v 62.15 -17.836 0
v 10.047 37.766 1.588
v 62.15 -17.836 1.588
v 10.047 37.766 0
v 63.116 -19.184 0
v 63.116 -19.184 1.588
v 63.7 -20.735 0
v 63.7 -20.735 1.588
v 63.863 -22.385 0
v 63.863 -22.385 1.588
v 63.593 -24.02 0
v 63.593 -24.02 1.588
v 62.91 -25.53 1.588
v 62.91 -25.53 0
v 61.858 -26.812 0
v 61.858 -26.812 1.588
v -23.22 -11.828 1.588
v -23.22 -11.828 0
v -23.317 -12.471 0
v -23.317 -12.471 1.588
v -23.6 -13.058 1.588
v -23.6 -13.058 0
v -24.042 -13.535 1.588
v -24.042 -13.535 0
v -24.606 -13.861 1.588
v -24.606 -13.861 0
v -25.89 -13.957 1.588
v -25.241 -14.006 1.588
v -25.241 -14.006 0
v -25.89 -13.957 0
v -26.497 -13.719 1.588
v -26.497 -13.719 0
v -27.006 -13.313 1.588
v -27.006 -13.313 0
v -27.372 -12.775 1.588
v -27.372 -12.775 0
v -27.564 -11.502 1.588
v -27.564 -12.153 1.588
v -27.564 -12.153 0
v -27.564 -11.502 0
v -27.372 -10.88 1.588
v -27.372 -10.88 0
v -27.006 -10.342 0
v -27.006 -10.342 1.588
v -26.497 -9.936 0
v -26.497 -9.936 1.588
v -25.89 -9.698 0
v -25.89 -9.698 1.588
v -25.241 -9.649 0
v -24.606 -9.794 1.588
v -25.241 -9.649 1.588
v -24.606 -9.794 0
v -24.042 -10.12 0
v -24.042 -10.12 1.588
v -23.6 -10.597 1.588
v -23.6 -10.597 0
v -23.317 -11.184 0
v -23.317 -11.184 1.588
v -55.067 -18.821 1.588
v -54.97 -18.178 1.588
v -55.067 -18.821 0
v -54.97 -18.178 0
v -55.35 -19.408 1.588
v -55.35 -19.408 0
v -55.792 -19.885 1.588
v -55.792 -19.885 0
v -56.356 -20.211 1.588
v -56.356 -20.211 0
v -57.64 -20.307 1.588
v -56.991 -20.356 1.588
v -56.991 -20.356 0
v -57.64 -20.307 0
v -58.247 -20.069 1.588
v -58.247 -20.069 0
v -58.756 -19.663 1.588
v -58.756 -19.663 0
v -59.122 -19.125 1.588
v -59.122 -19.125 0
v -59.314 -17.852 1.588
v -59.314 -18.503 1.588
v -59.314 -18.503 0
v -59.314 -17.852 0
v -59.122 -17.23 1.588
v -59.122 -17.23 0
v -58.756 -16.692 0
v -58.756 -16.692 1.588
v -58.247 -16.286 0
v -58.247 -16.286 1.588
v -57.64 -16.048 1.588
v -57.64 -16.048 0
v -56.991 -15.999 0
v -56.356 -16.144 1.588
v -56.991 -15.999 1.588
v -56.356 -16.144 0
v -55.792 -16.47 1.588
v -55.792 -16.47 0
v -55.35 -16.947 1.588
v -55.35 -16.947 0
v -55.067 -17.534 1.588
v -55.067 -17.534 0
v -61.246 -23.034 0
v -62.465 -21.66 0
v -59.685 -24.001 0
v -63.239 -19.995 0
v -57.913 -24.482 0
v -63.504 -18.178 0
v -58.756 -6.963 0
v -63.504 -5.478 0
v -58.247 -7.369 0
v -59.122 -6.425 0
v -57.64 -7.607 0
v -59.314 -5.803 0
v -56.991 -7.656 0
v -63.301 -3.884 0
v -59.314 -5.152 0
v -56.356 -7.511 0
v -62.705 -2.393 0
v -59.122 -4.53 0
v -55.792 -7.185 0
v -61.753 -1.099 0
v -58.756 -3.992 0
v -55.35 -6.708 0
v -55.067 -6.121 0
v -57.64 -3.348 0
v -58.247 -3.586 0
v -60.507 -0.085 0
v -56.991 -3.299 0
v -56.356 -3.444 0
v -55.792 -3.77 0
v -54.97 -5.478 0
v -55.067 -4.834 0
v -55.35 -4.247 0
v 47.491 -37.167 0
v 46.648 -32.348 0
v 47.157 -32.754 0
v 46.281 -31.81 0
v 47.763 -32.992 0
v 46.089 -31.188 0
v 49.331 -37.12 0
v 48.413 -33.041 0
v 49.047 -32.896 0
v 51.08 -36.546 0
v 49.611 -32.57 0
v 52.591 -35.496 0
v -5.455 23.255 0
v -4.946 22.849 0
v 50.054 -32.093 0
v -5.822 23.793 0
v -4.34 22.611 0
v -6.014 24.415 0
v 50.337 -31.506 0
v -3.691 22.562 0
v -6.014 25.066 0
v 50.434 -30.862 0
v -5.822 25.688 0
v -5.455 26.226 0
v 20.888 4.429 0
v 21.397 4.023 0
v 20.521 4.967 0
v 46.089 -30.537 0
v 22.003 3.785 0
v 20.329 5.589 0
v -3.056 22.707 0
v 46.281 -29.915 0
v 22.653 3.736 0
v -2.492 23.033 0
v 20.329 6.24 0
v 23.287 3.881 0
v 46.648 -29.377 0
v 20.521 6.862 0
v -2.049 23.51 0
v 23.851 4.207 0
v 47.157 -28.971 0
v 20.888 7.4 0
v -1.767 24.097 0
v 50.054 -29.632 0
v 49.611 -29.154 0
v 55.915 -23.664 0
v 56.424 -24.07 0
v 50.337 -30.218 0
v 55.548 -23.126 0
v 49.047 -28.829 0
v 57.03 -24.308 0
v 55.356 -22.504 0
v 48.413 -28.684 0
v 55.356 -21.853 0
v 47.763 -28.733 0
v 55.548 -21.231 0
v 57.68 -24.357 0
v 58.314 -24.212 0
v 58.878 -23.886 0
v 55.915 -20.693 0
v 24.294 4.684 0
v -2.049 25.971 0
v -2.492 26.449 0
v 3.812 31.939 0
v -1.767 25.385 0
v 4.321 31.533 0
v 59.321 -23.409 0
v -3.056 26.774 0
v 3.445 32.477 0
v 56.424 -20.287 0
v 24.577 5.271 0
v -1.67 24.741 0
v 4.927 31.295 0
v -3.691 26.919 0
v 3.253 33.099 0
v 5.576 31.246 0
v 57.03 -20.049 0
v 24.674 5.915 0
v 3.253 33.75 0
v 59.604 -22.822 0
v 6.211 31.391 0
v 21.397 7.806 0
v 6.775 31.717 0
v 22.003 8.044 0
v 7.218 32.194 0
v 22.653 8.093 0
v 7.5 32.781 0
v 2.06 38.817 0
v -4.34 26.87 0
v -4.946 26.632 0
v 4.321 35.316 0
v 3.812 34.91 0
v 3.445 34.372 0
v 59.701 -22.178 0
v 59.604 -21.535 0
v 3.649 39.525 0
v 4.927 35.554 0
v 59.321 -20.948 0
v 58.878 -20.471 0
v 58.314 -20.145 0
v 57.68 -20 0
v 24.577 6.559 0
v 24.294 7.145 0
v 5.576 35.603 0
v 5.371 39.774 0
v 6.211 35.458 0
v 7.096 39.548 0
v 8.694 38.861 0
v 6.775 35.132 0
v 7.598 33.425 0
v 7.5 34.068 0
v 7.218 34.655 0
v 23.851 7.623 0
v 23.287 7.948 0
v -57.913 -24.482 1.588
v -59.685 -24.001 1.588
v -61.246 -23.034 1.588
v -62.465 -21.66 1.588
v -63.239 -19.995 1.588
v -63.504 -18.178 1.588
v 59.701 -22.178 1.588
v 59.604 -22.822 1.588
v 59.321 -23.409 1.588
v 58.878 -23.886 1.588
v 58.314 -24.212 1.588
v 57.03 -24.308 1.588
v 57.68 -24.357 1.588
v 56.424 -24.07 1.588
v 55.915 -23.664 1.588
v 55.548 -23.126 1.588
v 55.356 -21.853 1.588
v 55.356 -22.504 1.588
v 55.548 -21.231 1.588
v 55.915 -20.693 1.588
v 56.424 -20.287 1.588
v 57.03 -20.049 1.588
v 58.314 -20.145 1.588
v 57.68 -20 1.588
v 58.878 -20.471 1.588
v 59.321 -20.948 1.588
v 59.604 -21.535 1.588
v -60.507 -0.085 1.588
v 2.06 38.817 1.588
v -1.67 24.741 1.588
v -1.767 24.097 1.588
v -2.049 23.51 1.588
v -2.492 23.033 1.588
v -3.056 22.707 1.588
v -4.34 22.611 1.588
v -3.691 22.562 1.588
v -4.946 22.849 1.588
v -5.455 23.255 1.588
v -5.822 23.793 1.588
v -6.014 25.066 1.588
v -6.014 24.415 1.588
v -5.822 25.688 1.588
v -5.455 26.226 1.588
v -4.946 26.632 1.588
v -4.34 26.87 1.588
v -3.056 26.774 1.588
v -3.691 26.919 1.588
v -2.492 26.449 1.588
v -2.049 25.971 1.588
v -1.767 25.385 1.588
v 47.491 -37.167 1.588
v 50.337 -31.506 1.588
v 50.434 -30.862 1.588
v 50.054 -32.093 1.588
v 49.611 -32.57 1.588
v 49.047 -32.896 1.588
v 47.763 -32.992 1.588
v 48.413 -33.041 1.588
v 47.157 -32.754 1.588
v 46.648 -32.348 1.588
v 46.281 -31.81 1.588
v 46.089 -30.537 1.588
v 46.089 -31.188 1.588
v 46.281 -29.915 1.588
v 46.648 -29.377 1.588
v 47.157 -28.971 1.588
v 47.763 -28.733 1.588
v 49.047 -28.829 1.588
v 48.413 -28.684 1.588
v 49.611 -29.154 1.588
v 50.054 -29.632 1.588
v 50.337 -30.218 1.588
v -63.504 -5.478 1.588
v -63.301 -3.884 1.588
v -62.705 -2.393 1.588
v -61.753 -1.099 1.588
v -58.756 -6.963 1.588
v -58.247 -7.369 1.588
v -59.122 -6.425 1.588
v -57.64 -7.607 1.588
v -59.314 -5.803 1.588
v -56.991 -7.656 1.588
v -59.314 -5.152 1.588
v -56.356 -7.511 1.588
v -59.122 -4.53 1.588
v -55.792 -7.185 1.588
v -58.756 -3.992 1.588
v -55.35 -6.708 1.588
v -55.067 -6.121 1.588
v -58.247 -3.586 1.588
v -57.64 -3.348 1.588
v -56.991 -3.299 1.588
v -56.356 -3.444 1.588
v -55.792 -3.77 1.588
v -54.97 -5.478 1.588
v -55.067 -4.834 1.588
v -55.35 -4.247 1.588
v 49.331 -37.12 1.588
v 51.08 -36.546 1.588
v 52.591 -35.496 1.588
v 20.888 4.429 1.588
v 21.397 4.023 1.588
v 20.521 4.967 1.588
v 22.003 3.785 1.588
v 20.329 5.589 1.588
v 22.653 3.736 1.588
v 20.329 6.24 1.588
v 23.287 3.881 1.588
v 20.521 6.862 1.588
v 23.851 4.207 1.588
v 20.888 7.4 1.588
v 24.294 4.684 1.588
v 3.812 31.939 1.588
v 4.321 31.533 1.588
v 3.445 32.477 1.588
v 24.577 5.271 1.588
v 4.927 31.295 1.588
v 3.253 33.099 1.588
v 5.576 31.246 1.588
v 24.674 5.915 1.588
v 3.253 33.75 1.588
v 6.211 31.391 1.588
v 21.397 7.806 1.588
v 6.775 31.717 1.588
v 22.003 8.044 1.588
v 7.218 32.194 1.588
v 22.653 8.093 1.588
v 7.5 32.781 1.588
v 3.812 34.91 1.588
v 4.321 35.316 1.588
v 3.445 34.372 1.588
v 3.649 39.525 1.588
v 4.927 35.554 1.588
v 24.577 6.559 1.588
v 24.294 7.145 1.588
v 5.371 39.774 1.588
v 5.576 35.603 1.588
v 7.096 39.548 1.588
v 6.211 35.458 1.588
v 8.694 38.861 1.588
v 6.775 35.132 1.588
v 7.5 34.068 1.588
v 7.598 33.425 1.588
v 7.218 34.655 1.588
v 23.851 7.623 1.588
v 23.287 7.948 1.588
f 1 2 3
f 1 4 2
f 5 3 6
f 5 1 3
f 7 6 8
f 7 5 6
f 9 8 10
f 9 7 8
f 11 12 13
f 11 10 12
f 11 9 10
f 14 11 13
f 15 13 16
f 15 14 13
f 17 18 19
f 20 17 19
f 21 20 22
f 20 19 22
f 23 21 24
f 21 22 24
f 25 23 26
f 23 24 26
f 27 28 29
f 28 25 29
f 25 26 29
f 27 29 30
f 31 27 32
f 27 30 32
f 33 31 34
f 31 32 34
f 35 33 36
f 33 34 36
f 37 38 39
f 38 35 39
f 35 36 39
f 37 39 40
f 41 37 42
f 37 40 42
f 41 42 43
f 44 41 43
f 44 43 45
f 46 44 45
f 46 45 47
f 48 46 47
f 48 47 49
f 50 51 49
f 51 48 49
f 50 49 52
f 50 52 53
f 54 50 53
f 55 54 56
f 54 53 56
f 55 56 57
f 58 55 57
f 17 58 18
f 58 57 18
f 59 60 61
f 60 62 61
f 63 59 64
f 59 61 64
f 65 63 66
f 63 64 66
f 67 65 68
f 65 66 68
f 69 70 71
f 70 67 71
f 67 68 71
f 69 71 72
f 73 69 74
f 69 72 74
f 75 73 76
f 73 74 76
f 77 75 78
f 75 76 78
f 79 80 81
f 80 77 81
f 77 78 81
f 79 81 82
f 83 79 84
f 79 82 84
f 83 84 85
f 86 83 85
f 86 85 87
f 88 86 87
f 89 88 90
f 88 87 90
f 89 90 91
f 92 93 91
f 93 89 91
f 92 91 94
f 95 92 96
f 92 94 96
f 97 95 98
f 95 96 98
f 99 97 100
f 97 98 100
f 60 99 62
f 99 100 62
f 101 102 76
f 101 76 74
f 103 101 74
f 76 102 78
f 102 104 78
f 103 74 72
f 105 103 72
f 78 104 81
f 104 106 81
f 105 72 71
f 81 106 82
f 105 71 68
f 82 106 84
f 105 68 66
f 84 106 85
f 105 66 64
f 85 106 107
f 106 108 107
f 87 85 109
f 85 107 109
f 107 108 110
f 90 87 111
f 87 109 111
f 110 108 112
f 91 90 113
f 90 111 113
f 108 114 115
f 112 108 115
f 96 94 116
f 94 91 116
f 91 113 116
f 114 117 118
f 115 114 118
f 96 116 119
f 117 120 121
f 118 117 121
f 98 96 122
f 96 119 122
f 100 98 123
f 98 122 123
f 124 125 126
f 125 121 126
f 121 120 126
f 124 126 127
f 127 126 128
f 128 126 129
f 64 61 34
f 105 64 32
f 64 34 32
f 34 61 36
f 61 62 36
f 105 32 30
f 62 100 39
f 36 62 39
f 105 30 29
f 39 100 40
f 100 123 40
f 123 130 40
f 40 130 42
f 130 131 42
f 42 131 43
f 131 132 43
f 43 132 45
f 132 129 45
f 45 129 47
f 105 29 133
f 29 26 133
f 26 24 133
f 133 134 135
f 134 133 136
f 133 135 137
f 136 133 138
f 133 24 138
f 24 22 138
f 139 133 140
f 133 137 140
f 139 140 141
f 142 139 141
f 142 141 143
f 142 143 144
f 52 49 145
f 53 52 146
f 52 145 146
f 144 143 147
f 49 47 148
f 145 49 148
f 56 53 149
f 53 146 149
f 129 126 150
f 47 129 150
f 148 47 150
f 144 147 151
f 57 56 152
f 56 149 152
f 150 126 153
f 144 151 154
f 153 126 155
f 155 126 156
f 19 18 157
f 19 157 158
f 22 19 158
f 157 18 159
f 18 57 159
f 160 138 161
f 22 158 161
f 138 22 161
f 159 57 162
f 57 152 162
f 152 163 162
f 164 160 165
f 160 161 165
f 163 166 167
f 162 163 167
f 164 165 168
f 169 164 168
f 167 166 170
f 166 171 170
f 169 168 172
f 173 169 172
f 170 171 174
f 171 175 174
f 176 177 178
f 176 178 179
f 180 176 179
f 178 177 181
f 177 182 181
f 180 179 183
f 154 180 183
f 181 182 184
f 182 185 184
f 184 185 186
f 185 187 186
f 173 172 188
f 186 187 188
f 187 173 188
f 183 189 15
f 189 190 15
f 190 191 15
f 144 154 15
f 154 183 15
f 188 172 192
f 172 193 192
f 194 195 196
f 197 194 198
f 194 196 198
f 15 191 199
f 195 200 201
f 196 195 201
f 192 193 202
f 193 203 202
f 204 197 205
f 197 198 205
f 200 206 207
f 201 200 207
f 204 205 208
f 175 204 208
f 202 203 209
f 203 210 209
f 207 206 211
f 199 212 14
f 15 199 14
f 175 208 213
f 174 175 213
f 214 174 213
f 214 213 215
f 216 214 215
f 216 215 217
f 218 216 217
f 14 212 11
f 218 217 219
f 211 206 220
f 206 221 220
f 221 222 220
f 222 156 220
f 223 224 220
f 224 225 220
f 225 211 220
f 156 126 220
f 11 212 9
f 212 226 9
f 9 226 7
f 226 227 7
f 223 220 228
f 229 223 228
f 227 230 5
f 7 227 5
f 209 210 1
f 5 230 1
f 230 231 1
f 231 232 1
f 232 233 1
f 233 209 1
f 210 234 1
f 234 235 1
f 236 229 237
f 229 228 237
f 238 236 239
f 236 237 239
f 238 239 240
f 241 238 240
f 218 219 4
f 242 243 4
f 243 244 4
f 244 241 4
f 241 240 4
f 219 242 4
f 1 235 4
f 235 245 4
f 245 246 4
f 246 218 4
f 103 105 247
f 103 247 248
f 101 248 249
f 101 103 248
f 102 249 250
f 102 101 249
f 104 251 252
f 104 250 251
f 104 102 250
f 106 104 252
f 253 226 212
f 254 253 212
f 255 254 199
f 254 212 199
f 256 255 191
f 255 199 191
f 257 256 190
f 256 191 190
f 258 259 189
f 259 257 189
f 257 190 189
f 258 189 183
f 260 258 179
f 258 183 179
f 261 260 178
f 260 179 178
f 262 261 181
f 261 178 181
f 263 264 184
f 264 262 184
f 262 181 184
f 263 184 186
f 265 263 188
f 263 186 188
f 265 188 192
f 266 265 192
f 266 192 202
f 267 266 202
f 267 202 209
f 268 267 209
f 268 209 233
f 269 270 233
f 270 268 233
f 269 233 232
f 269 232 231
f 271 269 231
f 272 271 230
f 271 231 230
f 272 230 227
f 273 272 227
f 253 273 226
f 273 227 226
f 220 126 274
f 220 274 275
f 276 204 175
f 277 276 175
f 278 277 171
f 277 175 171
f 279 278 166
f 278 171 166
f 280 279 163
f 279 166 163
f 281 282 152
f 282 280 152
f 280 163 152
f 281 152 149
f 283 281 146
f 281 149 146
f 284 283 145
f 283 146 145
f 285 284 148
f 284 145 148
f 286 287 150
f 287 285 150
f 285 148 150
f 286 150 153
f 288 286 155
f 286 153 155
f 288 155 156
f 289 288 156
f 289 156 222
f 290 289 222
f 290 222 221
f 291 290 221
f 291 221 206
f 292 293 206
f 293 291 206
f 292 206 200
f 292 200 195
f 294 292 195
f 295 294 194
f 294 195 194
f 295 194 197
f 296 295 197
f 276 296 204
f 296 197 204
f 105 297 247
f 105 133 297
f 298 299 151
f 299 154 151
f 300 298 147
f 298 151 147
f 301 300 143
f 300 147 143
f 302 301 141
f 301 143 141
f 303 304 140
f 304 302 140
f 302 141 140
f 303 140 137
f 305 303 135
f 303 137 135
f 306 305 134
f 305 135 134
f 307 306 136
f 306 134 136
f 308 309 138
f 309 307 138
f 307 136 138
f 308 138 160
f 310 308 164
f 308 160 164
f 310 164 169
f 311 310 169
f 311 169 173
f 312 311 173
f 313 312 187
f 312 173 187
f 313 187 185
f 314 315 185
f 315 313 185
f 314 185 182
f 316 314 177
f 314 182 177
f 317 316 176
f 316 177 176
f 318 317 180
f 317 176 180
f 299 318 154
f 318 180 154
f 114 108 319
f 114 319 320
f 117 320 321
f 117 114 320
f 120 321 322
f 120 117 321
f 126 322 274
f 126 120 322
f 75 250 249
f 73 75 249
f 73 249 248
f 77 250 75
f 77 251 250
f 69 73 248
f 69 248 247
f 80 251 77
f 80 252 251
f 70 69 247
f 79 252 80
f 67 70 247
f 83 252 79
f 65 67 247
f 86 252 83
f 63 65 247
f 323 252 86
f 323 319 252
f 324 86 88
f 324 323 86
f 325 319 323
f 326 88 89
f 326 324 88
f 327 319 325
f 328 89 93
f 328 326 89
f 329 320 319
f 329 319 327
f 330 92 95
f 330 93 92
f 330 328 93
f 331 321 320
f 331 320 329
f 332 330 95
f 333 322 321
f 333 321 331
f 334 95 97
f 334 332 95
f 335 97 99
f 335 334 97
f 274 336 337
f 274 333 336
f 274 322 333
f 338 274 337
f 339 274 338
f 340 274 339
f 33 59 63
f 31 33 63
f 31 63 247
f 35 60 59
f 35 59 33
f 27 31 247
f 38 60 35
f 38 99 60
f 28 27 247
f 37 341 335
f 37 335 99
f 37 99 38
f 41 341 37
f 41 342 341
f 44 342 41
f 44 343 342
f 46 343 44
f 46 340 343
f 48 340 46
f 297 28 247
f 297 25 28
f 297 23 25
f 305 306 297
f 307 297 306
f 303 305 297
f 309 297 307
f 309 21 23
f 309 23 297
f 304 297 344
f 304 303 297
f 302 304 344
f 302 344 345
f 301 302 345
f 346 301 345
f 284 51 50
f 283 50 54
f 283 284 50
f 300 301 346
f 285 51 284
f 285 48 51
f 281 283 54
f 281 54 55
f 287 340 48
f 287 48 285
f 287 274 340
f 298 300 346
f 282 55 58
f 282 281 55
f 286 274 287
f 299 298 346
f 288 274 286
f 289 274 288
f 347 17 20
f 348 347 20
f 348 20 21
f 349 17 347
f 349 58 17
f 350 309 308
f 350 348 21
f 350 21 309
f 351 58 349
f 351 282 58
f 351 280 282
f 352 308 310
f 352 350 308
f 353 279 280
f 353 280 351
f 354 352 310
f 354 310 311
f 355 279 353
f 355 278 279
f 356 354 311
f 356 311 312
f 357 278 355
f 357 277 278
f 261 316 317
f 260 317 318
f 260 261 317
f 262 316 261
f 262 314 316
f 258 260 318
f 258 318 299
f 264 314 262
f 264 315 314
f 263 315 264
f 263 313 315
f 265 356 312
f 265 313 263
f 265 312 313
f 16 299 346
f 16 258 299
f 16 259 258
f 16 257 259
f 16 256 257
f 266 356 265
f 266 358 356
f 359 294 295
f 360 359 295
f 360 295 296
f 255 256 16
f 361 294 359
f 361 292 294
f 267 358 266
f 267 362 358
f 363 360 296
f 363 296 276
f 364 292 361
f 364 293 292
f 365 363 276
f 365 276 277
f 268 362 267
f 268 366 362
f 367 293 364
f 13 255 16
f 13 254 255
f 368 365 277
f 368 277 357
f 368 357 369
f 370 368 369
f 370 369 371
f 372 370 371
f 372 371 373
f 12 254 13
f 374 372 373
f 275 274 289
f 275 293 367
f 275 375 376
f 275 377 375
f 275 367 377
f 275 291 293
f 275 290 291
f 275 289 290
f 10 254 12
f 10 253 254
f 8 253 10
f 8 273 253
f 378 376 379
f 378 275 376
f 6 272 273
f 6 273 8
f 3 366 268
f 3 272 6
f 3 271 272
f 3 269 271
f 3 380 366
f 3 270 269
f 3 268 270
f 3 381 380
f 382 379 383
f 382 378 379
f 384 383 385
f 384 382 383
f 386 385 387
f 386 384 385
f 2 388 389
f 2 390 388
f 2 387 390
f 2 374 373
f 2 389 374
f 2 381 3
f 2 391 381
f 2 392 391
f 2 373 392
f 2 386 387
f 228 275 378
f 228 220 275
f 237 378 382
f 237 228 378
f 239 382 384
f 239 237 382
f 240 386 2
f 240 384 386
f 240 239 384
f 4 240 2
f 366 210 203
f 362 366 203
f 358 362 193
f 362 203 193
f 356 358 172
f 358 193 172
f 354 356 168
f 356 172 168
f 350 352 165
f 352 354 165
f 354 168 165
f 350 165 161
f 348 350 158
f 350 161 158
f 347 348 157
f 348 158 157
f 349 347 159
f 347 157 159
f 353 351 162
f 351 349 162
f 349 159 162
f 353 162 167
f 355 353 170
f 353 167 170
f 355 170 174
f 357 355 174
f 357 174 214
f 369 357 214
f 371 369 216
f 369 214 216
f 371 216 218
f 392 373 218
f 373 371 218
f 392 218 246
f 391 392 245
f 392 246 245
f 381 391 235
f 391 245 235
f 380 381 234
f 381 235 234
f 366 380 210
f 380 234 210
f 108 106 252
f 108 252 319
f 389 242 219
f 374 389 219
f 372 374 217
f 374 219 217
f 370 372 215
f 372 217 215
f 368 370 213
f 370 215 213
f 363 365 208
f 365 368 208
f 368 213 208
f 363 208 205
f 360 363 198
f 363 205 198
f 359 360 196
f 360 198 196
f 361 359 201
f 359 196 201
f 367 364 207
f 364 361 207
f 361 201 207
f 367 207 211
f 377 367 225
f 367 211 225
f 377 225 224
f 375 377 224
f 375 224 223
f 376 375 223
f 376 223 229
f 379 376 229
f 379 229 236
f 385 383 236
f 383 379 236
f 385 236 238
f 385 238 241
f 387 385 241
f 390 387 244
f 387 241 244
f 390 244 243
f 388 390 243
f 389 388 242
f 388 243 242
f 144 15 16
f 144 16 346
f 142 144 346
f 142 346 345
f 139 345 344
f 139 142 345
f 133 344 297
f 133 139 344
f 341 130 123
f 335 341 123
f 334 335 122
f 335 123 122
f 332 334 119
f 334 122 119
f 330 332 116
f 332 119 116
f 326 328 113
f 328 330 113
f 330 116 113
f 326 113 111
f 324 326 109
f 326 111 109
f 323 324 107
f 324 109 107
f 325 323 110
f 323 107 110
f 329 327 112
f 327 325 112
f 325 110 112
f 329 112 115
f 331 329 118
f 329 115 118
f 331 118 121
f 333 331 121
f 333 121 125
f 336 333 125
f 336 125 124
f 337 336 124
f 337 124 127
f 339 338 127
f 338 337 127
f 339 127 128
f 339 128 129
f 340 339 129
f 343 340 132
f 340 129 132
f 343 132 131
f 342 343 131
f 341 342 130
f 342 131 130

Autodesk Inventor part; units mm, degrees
ref_plane "YZ Plane" through (0, 0, 0) normal (1, 0, 0) x (0, 1, 0)
ref_plane "XZ Plane" through (0, 0, 0) normal (0, 1, 0) x (-1, 0, 0)
ref_plane "XY Plane" through (0, 0, 0) normal (0, 0, 1) x (1, 0, 0)
sketch "Sketch1" plane through (0, 0, 0) normal (0, 0, 1) x (1, 0, 0)
  circle A0 centre (48.2493, -30.8623) radius 2.1844
  circle A1 centre (57.5164, -22.1784) radius 2.1844
  circle A2 centre (5.4131, 33.4246) radius 2.1844
  circle A3 centre (-3.854, 24.7407) radius 2.1844
  circle A4 centre (22.4893, 5.9147) radius 2.1844
  circle A5 centre (-57.1544, -5.4775) radius 2.1844 construction
  circle A6 centre (-57.1544, -18.1775) radius 2.1844 construction
  arc A7 (-60.5073, -0.0848) -> (-63.5044, -5.4775) centre (-57.1544, -5.4775) ccw
  arc A8 (-63.5044, -18.1775) -> (-57.9131, -24.482) centre (-57.1544, -18.1775) ccw
  circle A9 centre (-57.1544, -5.4775) radius 2.1844
  circle A10 centre (-57.1544, -18.1775) radius 2.1844
  arc A11 (10.0467, 37.7665) -> (2.0602, 38.8172) centre (5.4131, 33.4246) ccw
  arc A12 (61.8584, -26.812) -> (62.15, -17.8364) centre (57.5164, -22.1784) ccw
  arc A13 (47.4906, -37.1668) -> (52.5912, -35.4958) centre (48.2493, -30.8623) ccw
  line L0 (10.0467, 37.7665) -> (62.15, -17.8364)
  line L1 (61.8584, -26.812) -> (52.5912, -35.4958)
  line L2 (47.4906, -37.1668) -> (-57.9131, -24.482)
  line L3 (-63.5044, -18.1775) -> (-63.5044, -5.4775)
  line L4 (-60.5073, -0.0848) -> (2.0602, 38.8172)
  circle A14 centre (-25.4044, -11.8275) radius 2.1844
  dimension "d0" = 12.7
  dimension "d1" = 12.7
  dimension "d2" = 12.7
  dimension "d3" = 12.7
  dimension "d4" = 12.7
  dimension "d7" = 4.3688
  dimension "d8" = 31.75
  dimension "d9" = 6.35
extrude "Extrusion1" add sketch "Sketch1" along normal blind 1.5875
properties part number "2.1-Gearbox"
